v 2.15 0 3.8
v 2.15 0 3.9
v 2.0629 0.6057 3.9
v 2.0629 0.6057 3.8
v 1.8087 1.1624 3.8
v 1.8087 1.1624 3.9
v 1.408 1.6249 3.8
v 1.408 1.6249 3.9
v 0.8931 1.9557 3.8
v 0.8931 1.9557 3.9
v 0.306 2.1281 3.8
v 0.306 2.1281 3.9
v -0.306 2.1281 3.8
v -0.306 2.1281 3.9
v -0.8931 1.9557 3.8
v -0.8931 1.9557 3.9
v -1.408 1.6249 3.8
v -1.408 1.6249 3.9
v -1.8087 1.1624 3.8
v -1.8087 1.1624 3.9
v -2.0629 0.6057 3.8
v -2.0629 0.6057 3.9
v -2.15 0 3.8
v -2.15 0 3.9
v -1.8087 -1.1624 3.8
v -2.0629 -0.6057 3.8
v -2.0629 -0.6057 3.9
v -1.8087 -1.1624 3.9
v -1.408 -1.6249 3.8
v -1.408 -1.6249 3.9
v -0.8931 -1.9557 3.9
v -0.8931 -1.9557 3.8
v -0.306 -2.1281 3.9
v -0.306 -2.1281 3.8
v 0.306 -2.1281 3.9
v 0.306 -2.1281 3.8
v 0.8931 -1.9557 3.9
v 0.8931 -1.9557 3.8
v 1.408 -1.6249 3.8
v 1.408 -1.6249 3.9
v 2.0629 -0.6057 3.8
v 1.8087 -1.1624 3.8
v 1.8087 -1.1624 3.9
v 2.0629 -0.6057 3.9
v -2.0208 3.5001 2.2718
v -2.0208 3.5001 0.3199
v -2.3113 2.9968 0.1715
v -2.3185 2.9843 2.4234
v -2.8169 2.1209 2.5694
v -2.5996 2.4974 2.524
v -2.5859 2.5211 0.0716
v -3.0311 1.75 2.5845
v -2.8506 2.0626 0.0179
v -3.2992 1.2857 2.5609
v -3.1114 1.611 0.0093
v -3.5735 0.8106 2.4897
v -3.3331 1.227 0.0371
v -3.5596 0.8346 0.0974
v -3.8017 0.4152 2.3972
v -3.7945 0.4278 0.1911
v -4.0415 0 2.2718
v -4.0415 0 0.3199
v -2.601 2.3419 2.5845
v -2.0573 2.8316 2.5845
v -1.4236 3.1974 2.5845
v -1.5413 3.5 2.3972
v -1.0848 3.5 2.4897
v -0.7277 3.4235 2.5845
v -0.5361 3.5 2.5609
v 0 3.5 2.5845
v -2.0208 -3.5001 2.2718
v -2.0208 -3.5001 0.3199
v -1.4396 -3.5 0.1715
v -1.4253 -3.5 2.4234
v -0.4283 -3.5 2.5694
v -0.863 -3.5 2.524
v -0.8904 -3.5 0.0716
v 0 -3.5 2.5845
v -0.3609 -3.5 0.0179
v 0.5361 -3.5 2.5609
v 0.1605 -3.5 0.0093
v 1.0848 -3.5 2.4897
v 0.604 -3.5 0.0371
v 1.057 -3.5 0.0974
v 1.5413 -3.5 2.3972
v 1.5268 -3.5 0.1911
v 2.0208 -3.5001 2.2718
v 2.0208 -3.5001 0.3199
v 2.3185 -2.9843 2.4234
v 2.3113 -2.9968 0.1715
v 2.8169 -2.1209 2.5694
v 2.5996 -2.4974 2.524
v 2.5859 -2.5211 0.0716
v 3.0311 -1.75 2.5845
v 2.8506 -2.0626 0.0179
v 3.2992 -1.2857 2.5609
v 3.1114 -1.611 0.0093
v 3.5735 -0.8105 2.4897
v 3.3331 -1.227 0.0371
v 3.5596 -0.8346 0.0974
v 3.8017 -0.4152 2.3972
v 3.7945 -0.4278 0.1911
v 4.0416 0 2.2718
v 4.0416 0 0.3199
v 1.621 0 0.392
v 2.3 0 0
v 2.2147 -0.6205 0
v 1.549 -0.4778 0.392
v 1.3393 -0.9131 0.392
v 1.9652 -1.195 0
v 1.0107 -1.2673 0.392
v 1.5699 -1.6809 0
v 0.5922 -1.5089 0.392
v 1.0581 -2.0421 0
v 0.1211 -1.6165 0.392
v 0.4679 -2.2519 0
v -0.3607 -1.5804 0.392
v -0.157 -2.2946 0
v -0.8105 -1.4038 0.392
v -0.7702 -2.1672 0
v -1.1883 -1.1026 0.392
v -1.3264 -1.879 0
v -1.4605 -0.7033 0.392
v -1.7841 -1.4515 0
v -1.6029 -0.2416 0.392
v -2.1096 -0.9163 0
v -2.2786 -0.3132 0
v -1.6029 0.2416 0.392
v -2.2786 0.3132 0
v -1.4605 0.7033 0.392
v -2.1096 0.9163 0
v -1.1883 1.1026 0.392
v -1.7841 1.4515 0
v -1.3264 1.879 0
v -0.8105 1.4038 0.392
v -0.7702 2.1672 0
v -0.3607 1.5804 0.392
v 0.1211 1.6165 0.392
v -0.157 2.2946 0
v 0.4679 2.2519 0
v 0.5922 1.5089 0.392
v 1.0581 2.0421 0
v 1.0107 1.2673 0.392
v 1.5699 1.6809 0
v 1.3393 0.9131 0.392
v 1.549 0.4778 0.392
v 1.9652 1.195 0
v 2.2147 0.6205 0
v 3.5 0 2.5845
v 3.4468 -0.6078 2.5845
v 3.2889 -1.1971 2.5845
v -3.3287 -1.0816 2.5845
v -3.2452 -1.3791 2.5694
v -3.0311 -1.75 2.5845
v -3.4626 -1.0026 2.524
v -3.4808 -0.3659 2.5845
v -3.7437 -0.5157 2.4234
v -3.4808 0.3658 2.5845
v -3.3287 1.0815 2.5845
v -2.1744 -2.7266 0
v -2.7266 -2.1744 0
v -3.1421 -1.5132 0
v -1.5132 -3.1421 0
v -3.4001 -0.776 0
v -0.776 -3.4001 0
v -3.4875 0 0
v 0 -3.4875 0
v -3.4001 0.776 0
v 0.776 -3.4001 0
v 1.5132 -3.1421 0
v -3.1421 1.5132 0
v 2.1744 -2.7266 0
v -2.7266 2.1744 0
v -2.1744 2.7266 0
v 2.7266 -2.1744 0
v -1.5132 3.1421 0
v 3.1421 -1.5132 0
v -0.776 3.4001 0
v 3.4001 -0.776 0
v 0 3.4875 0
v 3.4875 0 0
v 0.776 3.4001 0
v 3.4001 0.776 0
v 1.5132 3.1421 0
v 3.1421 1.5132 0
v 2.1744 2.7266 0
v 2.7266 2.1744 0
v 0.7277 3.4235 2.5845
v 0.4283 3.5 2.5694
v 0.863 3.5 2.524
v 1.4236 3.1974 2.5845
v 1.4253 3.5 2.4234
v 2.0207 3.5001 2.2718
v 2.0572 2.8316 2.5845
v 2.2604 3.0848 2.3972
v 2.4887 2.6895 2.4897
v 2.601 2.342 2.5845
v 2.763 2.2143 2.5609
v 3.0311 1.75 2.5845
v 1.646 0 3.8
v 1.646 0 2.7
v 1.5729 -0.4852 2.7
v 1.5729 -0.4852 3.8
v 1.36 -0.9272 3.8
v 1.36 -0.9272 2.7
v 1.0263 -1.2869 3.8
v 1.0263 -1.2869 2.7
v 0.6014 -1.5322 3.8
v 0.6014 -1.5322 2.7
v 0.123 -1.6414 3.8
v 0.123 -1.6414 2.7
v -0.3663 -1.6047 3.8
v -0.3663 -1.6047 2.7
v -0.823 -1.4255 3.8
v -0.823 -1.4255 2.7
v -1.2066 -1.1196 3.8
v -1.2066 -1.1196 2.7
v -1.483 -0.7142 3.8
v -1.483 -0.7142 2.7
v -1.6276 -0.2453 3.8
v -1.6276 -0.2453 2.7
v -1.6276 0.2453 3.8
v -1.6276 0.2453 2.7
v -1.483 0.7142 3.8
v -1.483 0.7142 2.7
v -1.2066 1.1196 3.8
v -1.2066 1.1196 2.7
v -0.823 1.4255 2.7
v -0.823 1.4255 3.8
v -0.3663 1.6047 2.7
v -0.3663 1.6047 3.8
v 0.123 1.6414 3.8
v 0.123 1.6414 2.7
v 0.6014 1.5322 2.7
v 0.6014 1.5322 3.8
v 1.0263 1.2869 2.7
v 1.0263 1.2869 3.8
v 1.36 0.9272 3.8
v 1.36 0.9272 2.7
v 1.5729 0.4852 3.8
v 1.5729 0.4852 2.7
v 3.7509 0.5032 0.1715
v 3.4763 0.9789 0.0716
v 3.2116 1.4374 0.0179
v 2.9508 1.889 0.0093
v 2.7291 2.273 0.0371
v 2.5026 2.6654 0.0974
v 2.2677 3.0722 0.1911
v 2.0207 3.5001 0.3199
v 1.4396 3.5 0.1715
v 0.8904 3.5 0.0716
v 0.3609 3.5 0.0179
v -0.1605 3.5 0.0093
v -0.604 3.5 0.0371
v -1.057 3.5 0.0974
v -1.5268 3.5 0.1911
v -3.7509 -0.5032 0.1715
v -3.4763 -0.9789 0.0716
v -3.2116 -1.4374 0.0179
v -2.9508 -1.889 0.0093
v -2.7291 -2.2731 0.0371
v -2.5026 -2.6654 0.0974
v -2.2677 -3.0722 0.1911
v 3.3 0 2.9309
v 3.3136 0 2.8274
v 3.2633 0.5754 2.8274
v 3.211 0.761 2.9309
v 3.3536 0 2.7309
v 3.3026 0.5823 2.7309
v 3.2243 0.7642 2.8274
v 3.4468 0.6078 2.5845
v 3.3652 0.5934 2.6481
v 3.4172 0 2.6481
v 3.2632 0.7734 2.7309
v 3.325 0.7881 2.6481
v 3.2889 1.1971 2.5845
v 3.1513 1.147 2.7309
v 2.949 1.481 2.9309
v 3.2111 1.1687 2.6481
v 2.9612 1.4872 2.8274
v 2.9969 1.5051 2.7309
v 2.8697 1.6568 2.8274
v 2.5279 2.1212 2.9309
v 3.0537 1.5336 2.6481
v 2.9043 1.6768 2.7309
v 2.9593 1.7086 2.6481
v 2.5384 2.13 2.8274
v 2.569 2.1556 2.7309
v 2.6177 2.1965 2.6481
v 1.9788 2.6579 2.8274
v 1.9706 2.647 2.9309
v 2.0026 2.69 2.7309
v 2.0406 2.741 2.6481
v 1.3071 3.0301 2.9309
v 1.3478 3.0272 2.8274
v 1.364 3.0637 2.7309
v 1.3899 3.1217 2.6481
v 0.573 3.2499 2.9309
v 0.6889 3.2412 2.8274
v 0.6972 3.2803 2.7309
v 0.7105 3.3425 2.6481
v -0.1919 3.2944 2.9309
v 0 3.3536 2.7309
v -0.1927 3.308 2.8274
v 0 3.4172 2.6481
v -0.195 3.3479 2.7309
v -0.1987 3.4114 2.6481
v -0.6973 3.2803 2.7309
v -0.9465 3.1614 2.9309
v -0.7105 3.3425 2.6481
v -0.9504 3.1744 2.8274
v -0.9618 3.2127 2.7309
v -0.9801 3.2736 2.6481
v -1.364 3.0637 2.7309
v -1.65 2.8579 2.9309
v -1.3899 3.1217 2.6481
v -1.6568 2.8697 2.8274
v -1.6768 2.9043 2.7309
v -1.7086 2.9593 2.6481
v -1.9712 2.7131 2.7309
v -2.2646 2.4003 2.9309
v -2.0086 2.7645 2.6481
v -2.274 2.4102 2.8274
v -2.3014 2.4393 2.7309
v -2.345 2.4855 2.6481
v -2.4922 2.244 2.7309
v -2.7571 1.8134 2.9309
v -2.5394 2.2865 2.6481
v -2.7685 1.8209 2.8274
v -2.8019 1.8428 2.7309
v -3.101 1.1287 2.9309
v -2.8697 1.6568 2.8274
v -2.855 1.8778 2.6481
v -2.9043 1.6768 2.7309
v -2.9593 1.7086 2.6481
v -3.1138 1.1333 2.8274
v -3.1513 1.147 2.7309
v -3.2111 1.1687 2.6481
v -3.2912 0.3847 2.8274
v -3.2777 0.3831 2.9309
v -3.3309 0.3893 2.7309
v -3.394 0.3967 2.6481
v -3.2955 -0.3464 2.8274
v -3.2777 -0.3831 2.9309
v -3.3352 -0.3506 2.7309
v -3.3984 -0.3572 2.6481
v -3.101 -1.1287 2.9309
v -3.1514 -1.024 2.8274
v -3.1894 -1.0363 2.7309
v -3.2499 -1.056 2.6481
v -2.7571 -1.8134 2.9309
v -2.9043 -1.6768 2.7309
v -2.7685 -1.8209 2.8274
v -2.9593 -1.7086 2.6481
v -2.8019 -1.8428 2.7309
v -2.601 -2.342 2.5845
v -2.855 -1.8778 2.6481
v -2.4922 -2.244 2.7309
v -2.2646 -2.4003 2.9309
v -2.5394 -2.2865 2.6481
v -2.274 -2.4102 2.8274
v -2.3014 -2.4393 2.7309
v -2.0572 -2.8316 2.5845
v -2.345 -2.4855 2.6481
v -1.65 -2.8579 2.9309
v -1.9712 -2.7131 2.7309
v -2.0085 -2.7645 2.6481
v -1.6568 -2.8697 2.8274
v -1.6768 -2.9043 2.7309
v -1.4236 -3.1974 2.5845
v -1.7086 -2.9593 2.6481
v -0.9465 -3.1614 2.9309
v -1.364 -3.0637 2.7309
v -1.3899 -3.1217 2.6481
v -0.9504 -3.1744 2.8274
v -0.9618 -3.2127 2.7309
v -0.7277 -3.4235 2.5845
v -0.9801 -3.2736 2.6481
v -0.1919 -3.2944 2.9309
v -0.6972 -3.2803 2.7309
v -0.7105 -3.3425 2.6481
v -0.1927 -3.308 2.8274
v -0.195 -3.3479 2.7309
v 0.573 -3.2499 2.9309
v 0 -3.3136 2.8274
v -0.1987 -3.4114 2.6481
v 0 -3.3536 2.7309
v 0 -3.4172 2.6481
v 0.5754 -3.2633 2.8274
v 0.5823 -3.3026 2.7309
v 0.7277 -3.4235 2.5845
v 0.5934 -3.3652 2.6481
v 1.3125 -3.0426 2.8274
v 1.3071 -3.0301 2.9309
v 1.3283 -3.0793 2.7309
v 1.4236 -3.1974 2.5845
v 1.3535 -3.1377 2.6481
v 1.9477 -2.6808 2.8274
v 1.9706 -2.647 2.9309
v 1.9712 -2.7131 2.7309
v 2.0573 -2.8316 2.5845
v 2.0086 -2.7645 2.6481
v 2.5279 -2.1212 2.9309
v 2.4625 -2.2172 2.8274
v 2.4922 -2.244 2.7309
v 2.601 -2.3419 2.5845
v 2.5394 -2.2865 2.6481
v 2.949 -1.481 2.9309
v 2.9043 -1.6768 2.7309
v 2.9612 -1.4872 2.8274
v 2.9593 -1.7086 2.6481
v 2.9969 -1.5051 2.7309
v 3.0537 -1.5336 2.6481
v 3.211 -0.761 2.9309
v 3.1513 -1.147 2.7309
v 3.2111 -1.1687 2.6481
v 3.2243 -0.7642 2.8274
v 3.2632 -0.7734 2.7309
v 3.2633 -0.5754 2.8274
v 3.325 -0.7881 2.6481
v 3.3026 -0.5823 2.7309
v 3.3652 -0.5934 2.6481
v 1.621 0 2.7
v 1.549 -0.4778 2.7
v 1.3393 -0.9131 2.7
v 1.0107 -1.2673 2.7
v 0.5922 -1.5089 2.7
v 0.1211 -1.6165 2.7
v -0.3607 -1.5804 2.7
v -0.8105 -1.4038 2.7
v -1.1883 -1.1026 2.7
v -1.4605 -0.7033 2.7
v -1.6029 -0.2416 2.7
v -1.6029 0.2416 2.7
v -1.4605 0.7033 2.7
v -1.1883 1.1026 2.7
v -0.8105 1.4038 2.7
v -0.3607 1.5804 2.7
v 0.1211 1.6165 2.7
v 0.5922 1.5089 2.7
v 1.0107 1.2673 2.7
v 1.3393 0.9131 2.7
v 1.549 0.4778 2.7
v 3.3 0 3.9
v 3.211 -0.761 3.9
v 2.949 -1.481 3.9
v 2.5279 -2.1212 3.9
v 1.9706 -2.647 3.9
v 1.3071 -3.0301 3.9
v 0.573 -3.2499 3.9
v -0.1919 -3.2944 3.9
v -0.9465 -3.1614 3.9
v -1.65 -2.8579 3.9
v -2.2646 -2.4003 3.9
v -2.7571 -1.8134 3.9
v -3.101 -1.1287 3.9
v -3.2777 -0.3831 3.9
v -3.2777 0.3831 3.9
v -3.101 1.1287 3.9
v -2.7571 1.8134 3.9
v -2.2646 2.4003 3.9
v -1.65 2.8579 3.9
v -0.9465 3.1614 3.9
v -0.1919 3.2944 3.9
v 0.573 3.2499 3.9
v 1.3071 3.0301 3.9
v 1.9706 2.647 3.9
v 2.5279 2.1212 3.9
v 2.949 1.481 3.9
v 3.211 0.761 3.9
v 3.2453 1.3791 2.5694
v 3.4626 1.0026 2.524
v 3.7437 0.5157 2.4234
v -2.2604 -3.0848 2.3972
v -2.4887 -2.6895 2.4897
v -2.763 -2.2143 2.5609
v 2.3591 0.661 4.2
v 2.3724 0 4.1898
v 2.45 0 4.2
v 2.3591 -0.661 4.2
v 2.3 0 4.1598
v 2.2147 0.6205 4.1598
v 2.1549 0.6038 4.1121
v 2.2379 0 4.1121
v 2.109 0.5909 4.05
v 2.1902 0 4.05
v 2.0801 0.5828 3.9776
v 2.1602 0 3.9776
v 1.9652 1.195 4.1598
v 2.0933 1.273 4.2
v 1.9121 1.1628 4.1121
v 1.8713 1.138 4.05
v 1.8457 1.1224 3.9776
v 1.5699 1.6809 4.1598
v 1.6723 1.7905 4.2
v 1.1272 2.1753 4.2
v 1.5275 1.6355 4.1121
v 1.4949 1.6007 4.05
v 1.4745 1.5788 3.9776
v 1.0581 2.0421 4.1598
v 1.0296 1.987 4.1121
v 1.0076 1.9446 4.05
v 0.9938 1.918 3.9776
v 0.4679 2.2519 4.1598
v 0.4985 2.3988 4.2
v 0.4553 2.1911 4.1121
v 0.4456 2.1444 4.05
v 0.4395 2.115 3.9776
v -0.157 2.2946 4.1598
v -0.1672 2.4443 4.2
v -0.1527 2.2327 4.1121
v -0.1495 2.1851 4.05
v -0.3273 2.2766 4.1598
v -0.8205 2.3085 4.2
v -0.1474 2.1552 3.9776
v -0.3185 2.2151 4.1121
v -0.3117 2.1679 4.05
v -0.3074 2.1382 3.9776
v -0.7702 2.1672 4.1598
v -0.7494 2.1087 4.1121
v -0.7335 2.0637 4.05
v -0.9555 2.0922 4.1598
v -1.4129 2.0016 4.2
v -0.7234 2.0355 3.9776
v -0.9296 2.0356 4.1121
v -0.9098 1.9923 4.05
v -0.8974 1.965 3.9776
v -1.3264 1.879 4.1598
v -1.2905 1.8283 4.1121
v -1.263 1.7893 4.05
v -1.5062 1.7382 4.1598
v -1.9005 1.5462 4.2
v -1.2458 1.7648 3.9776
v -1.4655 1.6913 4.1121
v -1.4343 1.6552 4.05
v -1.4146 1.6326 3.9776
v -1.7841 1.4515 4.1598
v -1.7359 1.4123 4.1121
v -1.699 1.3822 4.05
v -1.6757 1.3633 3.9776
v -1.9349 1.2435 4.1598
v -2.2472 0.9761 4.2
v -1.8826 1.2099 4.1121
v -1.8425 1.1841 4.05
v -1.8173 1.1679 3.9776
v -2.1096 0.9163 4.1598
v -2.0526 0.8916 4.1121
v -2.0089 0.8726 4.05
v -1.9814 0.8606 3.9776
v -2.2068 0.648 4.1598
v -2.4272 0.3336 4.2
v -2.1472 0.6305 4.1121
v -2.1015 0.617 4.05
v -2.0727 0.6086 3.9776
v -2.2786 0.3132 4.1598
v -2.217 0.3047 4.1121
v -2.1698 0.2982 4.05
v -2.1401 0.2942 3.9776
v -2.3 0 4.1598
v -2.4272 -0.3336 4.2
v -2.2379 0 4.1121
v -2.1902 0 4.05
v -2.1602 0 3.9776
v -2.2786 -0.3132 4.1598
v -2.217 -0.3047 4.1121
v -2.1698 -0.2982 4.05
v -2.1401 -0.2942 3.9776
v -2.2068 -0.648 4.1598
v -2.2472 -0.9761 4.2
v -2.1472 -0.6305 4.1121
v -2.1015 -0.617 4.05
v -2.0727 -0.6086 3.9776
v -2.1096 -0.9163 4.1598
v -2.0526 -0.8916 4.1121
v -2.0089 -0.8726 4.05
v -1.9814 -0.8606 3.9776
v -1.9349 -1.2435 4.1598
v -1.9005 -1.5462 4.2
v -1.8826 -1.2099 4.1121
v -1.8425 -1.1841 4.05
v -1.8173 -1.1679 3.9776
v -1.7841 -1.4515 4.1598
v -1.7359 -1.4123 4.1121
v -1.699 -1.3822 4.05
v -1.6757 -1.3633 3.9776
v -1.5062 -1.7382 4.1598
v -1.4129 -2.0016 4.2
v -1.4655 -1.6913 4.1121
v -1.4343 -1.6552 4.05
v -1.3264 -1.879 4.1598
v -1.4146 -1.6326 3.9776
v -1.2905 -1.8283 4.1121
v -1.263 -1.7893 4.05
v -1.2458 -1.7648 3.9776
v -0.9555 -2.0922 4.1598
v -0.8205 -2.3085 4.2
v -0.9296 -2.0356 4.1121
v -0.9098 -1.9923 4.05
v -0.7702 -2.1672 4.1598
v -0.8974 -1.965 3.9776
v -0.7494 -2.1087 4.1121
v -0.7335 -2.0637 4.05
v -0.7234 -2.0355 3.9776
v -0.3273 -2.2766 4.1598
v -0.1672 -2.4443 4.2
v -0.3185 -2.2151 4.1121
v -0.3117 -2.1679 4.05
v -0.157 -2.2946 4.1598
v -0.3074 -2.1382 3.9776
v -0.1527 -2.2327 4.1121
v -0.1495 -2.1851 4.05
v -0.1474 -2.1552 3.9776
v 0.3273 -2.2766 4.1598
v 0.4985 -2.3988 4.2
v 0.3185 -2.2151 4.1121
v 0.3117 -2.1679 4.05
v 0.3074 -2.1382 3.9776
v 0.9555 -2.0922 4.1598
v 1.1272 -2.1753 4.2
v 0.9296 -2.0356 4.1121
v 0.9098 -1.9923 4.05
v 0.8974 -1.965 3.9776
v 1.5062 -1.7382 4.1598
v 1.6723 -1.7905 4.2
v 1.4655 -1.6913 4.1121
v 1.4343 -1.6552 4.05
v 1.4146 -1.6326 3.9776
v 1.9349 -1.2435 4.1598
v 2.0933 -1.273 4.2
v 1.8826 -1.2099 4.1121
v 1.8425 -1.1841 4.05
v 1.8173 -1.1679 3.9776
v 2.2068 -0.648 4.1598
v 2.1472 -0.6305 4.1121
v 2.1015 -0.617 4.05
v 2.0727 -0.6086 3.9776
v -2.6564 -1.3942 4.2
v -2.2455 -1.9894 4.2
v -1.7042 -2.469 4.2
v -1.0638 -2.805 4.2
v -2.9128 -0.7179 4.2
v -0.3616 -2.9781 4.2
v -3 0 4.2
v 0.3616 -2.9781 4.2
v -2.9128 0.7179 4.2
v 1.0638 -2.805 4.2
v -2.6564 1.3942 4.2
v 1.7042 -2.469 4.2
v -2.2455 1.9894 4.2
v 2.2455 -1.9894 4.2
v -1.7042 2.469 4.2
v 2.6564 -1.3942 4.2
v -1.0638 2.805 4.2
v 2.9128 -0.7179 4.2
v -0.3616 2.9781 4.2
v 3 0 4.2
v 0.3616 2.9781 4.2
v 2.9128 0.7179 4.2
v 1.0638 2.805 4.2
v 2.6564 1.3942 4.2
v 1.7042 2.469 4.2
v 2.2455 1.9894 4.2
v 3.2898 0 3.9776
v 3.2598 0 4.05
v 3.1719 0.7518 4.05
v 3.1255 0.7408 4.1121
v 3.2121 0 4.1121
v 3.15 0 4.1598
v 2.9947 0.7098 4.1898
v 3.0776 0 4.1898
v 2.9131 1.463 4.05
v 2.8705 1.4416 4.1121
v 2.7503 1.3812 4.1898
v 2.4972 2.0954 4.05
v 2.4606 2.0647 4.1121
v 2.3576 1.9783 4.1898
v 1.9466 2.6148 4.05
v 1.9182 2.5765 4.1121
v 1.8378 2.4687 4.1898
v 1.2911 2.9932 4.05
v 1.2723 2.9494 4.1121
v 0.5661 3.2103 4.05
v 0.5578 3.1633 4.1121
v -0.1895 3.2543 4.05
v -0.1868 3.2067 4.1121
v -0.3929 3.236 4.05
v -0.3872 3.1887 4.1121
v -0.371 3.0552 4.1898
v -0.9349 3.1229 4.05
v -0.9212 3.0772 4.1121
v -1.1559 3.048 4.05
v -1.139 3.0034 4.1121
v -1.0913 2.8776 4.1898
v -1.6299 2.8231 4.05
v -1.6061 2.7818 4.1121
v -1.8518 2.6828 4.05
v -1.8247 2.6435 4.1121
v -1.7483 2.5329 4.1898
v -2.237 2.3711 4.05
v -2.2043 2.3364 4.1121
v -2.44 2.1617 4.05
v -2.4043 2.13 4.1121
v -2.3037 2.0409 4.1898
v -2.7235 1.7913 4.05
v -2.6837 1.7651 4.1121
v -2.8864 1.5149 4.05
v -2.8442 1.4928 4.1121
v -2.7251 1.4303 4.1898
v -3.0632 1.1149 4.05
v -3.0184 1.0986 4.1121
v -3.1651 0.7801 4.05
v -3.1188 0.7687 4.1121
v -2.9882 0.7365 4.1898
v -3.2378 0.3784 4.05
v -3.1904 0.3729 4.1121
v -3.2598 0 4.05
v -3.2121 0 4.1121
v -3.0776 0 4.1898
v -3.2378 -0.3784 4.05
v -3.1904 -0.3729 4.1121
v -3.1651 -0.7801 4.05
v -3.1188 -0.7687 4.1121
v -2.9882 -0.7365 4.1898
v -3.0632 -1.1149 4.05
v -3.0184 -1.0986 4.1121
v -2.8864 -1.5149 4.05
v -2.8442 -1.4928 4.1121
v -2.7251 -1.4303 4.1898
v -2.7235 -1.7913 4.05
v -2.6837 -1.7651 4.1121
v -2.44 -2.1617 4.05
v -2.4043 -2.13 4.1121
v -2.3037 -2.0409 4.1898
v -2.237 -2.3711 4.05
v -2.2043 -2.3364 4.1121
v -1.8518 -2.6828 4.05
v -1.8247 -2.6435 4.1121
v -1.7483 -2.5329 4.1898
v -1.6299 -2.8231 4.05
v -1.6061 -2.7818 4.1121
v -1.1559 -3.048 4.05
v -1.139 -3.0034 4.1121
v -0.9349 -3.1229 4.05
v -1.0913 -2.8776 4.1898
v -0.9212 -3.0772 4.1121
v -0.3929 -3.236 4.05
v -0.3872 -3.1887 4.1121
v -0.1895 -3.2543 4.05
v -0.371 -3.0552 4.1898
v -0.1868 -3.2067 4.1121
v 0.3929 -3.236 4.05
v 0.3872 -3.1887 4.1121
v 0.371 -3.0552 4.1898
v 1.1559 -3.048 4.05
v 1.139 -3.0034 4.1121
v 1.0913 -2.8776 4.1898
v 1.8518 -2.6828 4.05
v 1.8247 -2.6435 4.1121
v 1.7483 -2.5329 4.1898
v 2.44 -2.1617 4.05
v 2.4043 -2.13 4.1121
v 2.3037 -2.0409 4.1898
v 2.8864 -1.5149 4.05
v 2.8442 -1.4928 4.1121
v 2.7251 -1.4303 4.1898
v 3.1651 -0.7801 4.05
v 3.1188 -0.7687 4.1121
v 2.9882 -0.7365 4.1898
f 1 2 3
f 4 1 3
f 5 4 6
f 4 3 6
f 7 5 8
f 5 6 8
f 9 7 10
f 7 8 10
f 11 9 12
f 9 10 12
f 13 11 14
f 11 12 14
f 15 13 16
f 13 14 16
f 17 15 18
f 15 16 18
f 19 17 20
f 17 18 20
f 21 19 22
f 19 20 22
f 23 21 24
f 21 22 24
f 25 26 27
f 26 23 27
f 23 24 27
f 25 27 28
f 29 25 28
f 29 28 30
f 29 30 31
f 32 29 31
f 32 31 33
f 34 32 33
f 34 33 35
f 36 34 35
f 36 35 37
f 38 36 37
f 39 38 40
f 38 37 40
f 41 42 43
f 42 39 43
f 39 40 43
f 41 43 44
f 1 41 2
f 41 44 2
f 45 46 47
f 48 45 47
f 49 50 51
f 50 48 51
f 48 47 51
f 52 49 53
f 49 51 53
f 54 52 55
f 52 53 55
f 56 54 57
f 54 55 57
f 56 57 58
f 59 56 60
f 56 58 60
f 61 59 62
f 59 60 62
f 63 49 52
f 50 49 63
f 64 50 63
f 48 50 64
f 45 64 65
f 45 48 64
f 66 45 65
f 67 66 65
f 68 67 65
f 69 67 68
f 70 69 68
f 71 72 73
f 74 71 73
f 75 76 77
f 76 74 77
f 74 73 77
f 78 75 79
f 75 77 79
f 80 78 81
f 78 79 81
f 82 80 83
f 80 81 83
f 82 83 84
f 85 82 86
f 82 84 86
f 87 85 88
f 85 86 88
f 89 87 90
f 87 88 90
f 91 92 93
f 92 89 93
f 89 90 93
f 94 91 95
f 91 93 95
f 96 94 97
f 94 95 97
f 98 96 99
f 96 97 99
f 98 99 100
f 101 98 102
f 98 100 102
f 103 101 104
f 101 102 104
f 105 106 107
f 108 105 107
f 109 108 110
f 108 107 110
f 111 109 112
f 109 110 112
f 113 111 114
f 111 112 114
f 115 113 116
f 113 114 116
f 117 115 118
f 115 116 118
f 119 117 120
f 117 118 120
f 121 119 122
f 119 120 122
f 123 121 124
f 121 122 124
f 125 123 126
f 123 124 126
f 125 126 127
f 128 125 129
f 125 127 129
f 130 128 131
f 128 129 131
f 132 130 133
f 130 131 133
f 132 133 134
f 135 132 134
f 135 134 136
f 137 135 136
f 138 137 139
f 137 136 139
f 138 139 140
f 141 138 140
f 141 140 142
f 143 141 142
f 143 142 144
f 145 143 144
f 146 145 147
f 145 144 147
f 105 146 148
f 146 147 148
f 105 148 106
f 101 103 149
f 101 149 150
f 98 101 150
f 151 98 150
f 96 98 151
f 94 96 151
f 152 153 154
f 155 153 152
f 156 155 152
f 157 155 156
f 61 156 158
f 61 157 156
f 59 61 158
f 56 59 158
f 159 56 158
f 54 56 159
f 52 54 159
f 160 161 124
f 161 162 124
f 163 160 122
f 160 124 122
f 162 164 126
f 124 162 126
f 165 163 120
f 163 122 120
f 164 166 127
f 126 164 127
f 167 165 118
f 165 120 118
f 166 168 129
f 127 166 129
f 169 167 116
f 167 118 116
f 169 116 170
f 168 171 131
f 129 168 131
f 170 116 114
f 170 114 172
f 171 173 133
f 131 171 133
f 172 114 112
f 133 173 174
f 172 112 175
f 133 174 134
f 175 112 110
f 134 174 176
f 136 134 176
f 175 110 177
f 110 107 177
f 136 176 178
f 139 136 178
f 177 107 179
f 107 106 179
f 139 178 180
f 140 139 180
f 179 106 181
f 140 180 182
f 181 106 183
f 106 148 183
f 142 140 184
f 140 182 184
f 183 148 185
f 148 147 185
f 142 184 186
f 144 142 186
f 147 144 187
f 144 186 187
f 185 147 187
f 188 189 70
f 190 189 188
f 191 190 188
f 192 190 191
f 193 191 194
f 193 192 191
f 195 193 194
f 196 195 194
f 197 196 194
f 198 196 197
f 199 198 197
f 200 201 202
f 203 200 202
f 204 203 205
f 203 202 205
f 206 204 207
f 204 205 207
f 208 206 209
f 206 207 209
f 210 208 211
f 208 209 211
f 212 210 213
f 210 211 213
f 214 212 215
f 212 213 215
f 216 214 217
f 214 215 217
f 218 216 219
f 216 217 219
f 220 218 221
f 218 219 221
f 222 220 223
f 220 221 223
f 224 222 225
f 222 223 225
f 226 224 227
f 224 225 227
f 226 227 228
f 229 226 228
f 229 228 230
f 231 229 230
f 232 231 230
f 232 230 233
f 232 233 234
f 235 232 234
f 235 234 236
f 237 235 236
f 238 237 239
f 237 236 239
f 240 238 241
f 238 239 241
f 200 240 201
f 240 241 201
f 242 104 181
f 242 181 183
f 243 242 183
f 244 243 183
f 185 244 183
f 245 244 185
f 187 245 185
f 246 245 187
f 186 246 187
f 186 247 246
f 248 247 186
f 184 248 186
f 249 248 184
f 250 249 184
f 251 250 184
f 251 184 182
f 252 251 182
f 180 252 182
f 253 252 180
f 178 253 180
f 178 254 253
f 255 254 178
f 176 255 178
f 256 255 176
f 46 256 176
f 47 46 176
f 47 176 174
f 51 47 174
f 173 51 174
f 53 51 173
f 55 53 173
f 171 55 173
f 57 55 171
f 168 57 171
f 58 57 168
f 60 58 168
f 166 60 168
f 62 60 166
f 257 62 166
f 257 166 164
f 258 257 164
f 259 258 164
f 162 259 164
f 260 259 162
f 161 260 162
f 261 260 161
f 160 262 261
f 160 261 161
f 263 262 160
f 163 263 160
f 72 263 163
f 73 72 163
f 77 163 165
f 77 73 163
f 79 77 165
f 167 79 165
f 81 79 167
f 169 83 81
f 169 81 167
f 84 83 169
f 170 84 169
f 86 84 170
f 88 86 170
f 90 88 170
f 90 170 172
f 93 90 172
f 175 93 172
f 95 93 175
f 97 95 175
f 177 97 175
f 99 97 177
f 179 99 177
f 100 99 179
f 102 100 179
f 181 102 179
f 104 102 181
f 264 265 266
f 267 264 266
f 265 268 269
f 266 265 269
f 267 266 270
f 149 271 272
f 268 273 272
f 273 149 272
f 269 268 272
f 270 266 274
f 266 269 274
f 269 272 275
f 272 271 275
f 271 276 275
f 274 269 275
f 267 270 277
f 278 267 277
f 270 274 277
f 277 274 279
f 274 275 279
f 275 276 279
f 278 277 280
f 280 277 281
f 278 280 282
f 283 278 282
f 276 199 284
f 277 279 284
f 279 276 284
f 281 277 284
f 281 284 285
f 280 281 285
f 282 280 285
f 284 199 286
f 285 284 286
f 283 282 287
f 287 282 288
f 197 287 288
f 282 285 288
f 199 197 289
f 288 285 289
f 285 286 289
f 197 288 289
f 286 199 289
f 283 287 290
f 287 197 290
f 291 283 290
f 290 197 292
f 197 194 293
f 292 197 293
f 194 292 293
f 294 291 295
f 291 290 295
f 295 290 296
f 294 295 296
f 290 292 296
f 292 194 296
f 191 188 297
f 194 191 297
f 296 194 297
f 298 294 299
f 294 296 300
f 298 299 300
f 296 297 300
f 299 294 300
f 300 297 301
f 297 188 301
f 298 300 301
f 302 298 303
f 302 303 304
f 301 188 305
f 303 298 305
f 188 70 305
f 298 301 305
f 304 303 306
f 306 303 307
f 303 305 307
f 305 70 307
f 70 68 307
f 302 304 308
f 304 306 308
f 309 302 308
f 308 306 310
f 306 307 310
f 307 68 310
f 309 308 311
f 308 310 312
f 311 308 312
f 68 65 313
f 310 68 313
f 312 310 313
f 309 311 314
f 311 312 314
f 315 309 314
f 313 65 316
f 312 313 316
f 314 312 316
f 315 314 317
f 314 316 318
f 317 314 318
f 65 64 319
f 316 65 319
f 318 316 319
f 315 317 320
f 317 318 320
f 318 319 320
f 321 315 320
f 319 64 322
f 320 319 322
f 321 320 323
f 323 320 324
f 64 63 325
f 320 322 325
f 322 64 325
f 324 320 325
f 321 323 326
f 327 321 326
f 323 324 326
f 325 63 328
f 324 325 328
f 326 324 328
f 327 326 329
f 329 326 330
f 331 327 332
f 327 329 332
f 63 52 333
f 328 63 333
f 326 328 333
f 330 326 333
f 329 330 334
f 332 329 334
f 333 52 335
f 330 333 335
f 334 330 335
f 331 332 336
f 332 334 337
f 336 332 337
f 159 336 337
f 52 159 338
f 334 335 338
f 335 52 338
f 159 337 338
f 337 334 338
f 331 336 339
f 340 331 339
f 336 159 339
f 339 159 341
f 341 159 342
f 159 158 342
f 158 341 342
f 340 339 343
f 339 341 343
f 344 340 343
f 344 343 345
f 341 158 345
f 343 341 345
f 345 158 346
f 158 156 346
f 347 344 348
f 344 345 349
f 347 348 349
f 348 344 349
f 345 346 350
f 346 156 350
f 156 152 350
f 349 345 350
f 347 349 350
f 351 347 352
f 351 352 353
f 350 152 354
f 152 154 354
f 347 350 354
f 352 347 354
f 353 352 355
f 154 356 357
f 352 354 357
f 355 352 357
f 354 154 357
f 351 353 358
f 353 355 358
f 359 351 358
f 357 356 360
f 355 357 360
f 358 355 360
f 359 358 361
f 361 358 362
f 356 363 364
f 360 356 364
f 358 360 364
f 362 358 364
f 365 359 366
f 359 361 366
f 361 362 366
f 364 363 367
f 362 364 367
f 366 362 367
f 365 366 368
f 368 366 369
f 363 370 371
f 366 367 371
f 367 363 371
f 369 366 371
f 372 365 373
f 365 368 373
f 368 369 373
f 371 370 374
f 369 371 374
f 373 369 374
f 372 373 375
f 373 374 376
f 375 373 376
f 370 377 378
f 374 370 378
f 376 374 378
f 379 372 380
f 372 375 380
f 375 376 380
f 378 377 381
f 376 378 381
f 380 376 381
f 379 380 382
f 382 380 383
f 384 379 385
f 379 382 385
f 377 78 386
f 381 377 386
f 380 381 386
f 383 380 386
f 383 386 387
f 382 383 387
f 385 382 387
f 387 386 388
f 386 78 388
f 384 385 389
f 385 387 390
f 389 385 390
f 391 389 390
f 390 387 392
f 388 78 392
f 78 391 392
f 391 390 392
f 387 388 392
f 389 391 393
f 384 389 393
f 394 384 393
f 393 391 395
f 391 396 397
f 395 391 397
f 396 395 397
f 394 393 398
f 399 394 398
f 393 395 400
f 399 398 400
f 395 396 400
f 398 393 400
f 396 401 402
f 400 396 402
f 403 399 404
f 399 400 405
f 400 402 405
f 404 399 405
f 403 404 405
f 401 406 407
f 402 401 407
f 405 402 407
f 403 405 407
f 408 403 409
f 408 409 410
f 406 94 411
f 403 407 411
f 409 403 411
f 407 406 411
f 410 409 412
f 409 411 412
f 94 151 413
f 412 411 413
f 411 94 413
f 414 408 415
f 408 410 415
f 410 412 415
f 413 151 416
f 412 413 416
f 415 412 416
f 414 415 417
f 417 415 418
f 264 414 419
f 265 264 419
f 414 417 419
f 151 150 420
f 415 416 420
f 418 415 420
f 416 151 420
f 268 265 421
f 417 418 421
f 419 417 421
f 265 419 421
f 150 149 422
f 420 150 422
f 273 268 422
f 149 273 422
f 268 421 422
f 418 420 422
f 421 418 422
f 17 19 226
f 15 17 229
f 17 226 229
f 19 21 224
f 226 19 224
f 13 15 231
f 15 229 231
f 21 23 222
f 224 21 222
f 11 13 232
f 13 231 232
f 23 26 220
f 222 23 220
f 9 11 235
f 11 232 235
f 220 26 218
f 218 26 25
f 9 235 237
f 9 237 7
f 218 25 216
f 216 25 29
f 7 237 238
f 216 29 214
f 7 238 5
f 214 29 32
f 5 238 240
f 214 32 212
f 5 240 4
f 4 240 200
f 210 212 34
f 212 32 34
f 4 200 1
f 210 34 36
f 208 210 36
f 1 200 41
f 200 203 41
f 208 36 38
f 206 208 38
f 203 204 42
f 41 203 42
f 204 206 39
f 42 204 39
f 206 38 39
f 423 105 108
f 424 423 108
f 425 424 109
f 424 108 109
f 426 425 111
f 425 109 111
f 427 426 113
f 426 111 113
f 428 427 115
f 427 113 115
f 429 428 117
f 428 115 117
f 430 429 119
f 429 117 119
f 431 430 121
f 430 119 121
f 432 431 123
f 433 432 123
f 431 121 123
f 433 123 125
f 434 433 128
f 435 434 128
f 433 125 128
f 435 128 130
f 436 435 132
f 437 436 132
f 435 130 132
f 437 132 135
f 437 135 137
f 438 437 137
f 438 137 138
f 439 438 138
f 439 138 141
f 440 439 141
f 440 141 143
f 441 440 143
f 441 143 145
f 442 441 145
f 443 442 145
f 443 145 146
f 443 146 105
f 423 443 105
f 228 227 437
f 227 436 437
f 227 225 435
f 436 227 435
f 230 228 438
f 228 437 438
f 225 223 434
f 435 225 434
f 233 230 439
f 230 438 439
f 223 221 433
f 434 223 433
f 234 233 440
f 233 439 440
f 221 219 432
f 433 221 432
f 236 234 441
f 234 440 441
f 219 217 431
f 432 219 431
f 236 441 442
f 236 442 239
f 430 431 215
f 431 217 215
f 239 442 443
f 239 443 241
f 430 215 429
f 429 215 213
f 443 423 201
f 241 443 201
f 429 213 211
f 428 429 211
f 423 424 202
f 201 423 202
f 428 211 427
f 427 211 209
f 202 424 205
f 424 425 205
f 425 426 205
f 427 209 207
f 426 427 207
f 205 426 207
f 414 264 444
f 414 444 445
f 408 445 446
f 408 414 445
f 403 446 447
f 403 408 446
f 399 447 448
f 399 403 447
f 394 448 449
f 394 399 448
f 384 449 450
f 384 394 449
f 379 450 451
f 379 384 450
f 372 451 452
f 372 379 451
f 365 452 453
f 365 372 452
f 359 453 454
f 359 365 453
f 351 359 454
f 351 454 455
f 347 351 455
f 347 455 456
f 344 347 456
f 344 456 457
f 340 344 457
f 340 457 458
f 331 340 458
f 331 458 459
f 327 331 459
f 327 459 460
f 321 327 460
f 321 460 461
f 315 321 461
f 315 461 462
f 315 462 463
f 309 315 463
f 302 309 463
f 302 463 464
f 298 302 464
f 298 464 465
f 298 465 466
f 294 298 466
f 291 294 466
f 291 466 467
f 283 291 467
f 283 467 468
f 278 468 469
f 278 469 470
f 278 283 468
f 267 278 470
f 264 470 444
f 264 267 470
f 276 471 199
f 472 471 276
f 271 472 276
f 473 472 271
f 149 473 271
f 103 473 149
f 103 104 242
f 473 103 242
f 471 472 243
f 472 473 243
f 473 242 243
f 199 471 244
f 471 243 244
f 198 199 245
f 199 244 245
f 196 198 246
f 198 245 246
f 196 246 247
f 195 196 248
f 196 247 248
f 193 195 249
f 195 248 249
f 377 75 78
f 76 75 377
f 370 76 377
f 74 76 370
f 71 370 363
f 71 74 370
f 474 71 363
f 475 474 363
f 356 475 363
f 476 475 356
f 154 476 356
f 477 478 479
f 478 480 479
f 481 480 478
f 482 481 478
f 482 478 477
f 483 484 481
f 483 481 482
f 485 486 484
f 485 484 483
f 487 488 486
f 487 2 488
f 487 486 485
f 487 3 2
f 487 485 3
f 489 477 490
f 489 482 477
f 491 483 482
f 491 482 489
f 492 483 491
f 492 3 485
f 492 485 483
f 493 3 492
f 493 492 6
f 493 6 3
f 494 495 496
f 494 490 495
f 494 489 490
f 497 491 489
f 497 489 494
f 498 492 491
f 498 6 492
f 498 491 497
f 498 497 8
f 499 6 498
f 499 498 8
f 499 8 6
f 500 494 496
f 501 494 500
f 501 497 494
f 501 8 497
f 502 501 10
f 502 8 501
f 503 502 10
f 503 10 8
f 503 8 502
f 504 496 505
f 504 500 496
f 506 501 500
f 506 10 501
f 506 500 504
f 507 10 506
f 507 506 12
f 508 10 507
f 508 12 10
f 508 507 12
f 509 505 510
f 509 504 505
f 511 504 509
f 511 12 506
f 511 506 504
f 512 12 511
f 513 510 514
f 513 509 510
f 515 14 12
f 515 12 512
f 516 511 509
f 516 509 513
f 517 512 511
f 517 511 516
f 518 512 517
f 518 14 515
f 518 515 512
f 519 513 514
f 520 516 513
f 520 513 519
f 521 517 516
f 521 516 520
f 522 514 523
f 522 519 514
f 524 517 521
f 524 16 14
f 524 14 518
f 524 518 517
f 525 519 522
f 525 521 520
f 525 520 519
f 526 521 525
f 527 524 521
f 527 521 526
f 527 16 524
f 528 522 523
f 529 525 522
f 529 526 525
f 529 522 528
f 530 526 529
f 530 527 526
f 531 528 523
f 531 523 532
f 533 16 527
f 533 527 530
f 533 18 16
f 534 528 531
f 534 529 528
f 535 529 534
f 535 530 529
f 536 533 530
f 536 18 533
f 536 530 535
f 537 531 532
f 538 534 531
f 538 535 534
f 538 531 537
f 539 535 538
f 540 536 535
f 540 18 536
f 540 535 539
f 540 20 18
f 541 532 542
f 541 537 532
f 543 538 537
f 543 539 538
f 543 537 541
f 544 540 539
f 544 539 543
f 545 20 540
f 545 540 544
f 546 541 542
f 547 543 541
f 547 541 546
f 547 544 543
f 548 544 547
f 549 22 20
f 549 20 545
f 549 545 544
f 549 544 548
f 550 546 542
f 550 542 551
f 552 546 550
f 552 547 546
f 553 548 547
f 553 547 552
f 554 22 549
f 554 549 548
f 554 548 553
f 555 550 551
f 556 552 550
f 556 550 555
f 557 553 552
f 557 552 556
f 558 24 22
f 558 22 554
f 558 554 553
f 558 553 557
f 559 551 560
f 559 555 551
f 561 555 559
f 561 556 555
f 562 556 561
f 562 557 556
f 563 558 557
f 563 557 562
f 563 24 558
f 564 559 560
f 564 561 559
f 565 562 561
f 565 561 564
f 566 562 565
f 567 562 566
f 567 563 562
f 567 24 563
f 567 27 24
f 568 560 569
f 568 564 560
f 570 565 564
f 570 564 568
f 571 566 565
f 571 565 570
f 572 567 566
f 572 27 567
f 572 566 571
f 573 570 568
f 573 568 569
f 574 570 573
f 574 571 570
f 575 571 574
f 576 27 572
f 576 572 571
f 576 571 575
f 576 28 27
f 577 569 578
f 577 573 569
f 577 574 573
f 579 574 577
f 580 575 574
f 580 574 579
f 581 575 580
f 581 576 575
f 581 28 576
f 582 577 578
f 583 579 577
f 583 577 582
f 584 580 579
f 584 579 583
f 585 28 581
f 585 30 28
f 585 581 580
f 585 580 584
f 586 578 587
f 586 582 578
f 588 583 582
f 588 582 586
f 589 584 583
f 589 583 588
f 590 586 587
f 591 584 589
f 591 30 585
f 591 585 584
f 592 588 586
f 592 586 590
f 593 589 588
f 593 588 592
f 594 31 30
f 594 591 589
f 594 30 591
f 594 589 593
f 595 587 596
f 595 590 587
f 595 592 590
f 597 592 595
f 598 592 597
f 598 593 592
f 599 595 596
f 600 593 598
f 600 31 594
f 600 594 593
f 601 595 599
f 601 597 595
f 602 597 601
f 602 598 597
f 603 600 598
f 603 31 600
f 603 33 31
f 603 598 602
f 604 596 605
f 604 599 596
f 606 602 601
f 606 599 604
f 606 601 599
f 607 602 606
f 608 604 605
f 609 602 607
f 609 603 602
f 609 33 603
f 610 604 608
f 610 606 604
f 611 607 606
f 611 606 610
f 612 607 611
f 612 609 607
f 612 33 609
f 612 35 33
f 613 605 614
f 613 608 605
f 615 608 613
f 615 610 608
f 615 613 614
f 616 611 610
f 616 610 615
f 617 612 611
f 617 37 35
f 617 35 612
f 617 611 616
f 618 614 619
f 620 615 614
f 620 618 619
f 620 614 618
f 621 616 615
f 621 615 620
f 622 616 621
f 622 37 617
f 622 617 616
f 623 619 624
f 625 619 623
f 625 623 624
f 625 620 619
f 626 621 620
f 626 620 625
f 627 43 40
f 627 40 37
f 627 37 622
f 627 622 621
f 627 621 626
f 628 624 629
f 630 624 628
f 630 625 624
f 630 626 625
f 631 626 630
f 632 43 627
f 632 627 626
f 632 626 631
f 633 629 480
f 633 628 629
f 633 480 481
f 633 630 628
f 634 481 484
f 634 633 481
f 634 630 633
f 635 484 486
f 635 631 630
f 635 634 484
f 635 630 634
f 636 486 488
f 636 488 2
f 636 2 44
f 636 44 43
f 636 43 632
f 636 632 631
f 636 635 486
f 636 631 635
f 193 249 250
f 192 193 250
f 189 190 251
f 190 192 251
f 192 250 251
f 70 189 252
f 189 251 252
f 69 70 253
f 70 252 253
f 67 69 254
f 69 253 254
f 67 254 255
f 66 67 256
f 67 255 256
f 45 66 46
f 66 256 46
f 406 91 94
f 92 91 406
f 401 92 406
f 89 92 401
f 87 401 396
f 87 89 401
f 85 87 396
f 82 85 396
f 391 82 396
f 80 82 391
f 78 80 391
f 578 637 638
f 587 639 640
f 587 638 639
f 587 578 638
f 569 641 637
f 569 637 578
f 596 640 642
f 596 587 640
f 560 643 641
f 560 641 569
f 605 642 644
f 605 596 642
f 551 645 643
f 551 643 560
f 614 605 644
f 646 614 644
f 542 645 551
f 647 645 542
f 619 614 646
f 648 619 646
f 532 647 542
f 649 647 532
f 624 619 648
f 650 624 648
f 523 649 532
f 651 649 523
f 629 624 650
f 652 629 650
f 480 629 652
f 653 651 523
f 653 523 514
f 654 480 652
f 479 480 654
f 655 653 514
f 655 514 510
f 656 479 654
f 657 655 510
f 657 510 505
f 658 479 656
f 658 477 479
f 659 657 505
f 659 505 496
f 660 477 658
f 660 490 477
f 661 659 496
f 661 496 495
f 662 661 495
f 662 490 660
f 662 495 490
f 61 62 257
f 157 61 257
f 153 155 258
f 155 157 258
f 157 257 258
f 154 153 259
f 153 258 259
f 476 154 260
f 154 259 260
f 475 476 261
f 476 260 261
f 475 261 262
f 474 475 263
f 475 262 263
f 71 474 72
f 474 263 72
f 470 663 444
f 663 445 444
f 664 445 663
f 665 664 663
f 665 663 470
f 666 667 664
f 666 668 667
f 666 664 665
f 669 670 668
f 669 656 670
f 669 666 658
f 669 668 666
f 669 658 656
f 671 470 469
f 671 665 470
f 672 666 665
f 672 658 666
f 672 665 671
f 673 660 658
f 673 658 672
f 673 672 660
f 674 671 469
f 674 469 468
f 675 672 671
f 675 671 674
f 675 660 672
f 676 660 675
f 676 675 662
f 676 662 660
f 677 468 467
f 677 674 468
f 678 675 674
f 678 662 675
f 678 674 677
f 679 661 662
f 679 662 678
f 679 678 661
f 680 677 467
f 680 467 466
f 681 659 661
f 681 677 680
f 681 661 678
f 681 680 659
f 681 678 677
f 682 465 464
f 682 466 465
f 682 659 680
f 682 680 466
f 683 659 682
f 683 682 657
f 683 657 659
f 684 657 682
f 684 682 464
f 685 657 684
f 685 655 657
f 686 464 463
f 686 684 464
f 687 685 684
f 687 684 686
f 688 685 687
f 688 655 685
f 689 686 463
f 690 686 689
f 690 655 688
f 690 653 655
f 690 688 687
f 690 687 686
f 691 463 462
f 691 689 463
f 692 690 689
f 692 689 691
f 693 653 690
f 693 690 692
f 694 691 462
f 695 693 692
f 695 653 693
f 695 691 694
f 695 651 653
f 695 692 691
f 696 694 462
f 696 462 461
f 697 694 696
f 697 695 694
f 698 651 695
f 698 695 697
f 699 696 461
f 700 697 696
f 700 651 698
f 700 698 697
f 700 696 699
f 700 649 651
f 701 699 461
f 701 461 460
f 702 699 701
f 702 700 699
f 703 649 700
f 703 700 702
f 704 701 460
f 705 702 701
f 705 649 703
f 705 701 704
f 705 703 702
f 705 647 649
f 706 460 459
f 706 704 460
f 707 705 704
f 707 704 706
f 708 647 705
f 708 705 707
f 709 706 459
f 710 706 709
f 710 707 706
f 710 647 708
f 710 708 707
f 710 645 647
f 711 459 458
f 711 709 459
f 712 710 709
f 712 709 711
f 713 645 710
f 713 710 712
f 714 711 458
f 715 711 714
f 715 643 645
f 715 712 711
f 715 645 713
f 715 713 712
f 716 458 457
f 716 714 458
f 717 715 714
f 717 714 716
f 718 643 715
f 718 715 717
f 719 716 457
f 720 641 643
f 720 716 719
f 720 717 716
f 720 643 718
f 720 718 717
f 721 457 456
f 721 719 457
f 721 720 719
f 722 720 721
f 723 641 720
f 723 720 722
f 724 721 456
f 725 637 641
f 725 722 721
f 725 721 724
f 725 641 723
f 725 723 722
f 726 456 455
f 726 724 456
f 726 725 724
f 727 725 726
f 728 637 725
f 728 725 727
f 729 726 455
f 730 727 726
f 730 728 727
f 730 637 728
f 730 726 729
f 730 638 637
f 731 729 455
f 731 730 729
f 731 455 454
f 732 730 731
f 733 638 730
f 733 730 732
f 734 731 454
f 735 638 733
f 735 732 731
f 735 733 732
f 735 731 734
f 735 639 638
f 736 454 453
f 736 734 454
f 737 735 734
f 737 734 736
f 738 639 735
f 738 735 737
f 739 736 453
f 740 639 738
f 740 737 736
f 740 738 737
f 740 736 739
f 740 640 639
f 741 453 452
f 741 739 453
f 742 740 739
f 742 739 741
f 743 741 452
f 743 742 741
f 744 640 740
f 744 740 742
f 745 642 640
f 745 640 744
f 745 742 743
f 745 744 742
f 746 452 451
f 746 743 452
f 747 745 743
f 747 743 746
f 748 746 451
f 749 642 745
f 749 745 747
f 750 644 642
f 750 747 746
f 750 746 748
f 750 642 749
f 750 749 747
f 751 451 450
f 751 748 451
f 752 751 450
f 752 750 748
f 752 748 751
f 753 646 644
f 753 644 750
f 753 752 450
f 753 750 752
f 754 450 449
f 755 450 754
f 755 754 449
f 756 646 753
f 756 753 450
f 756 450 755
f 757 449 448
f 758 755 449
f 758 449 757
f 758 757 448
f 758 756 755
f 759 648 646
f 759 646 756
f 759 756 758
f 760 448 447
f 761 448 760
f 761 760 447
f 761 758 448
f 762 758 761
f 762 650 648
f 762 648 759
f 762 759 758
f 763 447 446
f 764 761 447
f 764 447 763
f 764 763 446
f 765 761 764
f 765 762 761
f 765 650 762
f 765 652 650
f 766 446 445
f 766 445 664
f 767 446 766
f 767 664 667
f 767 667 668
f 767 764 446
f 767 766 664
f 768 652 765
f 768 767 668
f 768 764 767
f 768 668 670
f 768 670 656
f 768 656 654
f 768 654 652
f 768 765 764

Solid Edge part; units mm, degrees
sketch "Sketch1" plane through (0, 0, 0) normal (0, 0, 1) x (1, 0, 0)
  circle A0 centre (0, 0) radius 1.621
  circle A1 centre (0, 0) radius 4.0415
  dimension "D1" = 3.5
  dimension "D2" = 3.242
extrude "Protrusion1" add sketch "Sketch1" along normal blind 4.2
sketch "Sketch2" plane through (0, 0, 0) normal (0, 0, 1) x (1, 0, 0)
  line L0 (4.0415, 0) -> (2.0207, 3.5)
  arc A0 (2.0207, 3.5) -> (4.0415, 0) centre (0, 0) cw
  dimension "D1" = 3.5
extrude "ExtrudedCutout_1" cut sketch "Sketch2" along normal blind 4.2
pattern_circular "Pattern1" count 6 over 360 about axis through (0, 0, 0) along (0, 0, -1) of "ExtrudedCutout_1"
cosmetic_thread "Thread_1" size "M4" thread depth 2.7
sketch "Sketch3" plane through (0, 0, 0) normal (0, -1, 0) x (1, 0, 0)
  line L0 (4.0416, 0.3199) -> (4.0416, 0)
  line L1 (4.0416, 0) -> (3.4875, 0)
  line L2 (3.4875, 0) -> (4.0416, 0.3199)
  line L3 (3.3, 4.2) -> (3.3, 2.9309)
  arc A0 (3.3, 2.9309) -> (3.5, 2.5845) centre (3.7, 2.9309) ccw
  line L4 (3.5, 2.5845) -> (4.0416, 2.2718)
  line L5 (4.0416, 2.2718) -> (4.0416, 4.2)
  line L6 (4.0416, 4.2) -> (3.3, 4.2)
  dimension "D1" = 4.2
  dimension "D2" = 3.4875
  dimension "D3" = 4.0416
  dimension "D4" = 3.3
  dimension "D5" = 4.0416
  dimension "D6" = 2.7
  dimension "D7" = 0.4
revolve "RevolvedCutout_1" cut sketch "Sketch3" angle 360 about axis through (0, 0, 11.9) along (0, 0, -1)
sketch "Sketch4" plane through (0, 0, 0) normal (0, -1, 0) x (1, 0, 0)
  line L0 (1.621, 4.2) -> (1.621, 2.7)
  line L1 (2.15, 4.2) -> (1.621, 4.2)
  line L2 (2.15, 3.8) -> (2.15, 4.2)
  line L3 (1.646, 3.8) -> (2.15, 3.8)
  line L4 (1.646, 3.8) -> (1.646, 2.7)
  line L5 (1.646, 2.7) -> (1.621, 2.7)
  dimension "D1" = 2.7
  dimension "D2" = 4.2
  dimension "D3" = 0.4
  dimension "D4" = 1.621
  dimension "D5" = 0.025
  dimension "D6" = 2.15
revolve "RevolvedCutout_2" cut sketch "Sketch4" angle 360 about axis through (0, 0, 8.4) along (0, 0, -1)
fillet "Round_1" radius 0.3 2 edges at (-3.3, 0, 4.2) (-2.15, 0, 4.2)
chamfer "Chamfer_1" distance 0.679 angle 30 1 edges at (-1.621, 0, 0) measured on face at (-2.3947, -2.2552, 0)
properties material "Stahl"
